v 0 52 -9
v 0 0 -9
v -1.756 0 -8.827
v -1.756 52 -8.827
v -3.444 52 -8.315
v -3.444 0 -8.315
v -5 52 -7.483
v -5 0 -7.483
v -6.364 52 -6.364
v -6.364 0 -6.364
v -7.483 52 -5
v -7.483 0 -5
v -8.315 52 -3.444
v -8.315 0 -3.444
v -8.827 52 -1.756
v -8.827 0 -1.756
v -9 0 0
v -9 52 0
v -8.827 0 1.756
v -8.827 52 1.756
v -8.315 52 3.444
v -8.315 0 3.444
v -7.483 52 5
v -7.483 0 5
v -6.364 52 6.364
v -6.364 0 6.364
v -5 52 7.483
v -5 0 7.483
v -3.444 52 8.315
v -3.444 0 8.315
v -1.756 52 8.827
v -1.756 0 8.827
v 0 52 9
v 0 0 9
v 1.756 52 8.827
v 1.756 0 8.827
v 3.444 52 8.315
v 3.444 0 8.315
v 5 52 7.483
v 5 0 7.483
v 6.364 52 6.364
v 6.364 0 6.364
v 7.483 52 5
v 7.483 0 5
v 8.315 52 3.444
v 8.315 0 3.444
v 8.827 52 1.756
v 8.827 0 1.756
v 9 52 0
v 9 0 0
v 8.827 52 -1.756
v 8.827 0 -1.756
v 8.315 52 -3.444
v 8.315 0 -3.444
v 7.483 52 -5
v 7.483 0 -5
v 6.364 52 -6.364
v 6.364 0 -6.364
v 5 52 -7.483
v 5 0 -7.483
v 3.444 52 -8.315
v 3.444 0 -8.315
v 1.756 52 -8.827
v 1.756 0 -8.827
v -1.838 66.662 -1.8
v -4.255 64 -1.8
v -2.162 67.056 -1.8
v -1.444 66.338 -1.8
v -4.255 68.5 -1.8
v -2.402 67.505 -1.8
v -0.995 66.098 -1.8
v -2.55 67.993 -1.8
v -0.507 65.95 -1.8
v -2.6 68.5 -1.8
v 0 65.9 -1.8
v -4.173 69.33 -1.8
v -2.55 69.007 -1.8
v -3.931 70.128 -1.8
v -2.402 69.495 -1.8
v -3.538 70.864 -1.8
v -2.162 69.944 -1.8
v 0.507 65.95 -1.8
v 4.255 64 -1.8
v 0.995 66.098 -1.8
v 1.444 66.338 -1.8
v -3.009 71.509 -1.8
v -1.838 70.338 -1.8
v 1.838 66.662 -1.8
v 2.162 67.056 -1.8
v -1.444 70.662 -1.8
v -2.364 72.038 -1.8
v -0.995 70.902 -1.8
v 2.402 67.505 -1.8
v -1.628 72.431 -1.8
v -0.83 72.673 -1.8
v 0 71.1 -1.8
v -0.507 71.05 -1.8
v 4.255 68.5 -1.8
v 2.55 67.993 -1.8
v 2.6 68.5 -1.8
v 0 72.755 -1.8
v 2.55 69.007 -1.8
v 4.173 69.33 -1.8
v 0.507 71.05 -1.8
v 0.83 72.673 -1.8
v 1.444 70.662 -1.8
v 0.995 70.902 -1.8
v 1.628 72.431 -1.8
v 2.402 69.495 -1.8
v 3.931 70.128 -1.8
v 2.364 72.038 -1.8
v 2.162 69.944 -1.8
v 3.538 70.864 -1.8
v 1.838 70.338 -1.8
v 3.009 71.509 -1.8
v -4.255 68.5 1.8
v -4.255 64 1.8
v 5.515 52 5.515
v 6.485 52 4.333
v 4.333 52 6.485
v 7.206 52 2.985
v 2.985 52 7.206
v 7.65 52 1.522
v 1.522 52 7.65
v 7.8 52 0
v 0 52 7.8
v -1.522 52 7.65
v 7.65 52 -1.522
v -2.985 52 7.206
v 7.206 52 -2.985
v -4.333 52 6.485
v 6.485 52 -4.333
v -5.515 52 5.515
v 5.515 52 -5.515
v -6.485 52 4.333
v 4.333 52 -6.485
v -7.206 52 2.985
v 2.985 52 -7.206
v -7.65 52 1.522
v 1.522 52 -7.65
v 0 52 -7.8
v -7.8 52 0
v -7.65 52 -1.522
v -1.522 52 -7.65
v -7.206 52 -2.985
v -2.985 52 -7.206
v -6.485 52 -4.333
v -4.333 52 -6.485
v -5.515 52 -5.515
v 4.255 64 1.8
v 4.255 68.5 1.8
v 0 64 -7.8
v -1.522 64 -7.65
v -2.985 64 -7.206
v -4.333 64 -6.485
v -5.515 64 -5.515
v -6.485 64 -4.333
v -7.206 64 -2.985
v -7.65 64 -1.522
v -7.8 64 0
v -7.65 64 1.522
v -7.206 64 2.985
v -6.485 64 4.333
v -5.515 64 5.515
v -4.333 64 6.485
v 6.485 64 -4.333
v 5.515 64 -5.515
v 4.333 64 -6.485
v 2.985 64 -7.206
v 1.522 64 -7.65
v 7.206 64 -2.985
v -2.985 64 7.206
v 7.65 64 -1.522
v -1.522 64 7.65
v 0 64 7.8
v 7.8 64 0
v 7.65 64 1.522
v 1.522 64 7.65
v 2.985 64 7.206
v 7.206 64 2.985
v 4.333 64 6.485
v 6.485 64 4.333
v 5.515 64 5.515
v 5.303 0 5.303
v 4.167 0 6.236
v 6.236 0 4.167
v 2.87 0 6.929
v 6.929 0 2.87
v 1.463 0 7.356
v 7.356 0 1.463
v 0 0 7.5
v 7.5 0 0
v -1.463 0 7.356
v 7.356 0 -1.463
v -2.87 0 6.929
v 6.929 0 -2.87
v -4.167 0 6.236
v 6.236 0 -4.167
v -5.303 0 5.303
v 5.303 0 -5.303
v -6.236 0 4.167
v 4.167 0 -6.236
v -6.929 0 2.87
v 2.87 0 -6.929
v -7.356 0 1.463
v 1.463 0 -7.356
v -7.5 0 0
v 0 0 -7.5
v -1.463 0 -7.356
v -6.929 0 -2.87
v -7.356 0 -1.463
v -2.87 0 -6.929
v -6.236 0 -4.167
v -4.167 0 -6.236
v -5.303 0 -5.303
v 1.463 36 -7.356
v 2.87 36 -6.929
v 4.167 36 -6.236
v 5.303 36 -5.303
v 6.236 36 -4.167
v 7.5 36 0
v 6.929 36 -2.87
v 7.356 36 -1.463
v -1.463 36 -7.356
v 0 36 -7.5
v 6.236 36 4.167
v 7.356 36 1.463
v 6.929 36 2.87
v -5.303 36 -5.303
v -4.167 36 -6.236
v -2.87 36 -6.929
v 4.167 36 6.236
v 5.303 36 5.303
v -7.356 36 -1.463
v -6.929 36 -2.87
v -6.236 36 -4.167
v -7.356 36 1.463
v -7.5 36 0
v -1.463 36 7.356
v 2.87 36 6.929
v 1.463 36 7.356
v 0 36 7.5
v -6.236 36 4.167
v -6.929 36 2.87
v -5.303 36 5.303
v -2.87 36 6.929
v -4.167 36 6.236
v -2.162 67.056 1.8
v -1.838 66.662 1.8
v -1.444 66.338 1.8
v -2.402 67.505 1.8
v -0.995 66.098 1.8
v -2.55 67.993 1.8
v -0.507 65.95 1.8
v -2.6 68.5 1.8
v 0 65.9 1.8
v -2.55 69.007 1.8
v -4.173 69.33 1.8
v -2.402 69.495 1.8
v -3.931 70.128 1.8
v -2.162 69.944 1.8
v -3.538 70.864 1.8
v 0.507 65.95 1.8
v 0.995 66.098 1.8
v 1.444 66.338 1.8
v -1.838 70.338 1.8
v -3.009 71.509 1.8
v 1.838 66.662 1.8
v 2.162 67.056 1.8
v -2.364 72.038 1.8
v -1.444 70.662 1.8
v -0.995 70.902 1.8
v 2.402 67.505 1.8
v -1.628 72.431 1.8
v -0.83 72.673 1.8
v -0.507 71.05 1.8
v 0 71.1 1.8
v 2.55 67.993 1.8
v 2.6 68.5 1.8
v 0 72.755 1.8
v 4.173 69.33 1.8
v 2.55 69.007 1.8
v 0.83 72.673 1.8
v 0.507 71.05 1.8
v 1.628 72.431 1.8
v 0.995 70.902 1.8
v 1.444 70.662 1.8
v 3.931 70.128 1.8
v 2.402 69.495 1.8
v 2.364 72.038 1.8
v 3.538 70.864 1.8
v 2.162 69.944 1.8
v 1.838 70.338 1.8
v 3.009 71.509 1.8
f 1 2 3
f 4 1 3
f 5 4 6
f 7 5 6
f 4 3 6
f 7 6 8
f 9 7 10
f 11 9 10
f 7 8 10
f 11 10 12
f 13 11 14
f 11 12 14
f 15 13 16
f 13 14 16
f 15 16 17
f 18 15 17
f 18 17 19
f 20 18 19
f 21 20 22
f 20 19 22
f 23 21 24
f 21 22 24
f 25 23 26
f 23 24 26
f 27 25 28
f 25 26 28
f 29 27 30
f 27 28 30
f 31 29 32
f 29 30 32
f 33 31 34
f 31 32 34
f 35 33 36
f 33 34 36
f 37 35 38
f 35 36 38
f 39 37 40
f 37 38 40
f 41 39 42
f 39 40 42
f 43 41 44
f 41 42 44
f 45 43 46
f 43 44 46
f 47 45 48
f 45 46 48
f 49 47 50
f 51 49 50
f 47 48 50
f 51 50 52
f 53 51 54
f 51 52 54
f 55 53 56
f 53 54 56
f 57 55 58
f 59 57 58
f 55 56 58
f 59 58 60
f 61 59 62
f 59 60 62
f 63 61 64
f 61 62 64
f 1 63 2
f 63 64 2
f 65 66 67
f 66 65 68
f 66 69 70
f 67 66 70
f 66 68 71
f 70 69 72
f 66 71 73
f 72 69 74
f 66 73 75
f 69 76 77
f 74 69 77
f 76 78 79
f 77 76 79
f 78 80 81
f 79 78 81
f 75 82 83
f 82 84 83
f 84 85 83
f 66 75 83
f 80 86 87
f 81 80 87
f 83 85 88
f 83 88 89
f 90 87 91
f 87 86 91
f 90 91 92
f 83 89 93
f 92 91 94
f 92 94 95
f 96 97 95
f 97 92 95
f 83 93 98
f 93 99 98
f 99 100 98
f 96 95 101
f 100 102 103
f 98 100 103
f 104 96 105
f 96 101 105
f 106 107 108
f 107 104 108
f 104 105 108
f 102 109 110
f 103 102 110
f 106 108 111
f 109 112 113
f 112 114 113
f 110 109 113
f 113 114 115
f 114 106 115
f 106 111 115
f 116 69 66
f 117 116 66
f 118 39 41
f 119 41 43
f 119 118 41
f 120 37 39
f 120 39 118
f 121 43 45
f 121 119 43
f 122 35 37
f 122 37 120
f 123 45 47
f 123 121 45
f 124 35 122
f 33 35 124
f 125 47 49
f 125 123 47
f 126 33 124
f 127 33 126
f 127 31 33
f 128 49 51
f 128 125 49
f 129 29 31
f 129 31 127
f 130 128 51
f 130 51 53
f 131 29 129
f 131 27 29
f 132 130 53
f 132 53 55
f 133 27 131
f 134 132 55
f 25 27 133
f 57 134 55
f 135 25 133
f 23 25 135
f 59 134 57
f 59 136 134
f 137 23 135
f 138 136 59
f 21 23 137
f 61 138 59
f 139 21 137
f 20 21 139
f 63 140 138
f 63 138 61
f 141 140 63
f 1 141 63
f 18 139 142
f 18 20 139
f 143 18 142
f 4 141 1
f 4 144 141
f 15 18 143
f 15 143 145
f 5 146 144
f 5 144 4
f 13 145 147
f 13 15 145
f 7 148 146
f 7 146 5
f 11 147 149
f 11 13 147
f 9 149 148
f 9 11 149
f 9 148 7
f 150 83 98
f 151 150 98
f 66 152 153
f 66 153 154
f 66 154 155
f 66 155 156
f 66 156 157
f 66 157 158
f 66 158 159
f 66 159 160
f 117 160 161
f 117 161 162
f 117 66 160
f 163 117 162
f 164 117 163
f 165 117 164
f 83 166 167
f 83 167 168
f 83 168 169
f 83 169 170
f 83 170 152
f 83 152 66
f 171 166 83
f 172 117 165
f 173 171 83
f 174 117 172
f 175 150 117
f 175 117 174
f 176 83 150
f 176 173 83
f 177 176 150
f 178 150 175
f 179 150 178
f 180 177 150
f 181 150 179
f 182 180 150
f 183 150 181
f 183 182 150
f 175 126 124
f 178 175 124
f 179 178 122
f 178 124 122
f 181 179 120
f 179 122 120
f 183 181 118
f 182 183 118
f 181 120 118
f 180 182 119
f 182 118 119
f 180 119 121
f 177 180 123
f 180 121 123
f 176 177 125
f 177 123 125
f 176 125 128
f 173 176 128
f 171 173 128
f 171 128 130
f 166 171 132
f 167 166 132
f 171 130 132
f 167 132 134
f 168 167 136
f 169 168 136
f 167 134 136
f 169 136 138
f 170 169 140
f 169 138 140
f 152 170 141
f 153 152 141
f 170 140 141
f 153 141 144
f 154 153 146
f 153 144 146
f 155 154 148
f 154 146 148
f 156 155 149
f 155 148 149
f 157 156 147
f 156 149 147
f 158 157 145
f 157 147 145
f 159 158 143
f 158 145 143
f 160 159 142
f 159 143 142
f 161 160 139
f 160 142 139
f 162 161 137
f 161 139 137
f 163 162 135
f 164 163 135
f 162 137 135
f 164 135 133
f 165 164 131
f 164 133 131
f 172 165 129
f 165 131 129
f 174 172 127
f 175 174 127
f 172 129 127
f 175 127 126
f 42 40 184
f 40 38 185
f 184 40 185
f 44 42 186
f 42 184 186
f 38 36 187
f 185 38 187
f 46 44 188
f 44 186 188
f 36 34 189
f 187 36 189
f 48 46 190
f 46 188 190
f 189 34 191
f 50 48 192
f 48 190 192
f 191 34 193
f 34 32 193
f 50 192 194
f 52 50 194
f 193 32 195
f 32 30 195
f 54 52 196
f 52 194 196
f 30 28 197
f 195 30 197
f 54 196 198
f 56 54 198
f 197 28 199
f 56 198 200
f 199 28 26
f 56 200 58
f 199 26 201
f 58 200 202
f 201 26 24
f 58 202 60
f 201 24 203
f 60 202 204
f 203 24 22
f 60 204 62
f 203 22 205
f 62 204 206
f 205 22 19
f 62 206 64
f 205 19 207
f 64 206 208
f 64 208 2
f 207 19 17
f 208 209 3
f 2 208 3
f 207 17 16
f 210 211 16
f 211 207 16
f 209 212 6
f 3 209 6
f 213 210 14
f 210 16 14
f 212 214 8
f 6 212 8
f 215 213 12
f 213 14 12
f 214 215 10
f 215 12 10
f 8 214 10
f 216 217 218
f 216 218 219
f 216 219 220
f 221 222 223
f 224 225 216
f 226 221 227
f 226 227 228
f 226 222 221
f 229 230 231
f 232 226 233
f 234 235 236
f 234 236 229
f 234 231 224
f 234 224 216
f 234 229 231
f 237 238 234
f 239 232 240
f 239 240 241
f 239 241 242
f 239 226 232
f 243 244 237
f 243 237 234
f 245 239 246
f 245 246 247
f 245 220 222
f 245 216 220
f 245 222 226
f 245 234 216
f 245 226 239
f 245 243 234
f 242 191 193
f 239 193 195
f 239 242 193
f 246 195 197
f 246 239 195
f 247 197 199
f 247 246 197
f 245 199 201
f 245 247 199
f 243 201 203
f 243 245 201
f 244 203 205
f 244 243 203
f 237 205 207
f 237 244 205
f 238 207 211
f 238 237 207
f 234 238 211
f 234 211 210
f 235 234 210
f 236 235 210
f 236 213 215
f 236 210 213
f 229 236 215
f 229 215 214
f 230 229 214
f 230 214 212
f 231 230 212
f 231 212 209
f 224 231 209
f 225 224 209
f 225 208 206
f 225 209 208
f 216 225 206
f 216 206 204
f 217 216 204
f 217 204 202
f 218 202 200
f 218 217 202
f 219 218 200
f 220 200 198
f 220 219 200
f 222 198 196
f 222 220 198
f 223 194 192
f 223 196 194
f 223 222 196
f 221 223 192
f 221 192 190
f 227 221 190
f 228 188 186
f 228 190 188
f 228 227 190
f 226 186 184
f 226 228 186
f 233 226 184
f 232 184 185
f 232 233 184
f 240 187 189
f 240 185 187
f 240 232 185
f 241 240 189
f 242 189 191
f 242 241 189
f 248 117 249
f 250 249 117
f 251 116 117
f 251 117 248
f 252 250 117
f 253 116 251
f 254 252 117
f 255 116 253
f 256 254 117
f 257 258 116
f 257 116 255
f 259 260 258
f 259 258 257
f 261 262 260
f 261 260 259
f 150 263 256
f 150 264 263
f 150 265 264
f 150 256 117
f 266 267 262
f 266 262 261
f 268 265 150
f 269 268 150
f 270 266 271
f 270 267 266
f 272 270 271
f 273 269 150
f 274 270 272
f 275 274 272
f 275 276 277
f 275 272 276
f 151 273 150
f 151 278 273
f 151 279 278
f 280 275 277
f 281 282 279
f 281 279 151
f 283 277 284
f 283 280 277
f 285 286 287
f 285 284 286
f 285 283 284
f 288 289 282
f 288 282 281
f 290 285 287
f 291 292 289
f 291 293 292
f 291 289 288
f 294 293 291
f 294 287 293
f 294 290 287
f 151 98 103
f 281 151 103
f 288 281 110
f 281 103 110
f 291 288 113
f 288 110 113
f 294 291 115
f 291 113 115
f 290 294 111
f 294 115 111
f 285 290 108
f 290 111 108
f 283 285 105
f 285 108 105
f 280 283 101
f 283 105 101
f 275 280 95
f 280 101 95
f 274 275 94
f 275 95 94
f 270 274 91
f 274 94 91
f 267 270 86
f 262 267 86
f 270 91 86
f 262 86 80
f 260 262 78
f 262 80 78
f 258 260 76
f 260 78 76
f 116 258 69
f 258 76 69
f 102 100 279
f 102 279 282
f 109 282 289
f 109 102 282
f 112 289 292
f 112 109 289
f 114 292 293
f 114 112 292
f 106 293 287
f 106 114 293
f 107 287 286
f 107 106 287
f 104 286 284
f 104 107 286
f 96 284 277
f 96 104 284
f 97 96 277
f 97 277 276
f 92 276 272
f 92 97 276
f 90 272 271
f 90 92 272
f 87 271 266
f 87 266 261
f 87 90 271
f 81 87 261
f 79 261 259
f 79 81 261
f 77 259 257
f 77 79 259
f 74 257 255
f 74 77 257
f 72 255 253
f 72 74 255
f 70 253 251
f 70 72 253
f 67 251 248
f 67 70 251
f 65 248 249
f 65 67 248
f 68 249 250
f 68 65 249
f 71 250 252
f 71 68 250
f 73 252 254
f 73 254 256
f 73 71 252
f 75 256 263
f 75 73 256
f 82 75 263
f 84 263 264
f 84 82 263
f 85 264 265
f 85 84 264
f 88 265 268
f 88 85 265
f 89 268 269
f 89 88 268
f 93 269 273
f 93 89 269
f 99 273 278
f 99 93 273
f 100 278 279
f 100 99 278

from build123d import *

# Parameters (mm, degrees)
SKETCH_1_R               = 9
EXTRUDE_1_DEPTH          = 52
SKETCH_2_R               = 7.8
EXTRUDE_2_DEPTH          = 12
EXTRUDE_3_DEPTH          = 1.8
EXTRUDE_3_DEPTH_BACK     = 1.8
SKETCH_3_R               = 2.6
EXTRUDE_4_DEPTH          = 1.8
EXTRUDE_4_DEPTH_BACK     = 1.8
SKETCH_4_R               = 1.6
CUT_EXTRUDE_1_DEPTH      = 27
CUT_EXTRUDE_1_DEPTH_BACK = 36
SKETCH_5_R               = 7.5


with BuildPart() as part:
    # 草图1 → 凸台-拉伸1 (new body)
    with BuildSketch(Plane(origin=(0, 0, 0), x_dir=(1, 0, 0), z_dir=(0, 1, 0))):
        Circle(SKETCH_1_R)
    extrude(amount=EXTRUDE_1_DEPTH)

    # 草图2 → 凸台-拉伸2 (add)
    with BuildSketch(Plane(origin=(0, 52, 0), x_dir=(1, 0, 0), z_dir=(0, 1, 0))):
        Circle(SKETCH_2_R)
    extrude(amount=EXTRUDE_2_DEPTH)

    # 草图3 → 凸台-拉伸3 (add, two sides: drawn at the far end of the back side and taken through both)
    with BuildSketch(Plane.XY.offset(-EXTRUDE_3_DEPTH_BACK)):
        with BuildLine():
            Line((-4.255, 68.5), (-4.255, 59.5))
            Line((-4.255, 59.5), (4.255, 59.5))
            Line((4.255, 59.5), (4.255, 68.5))
            ThreePointArc((4.255, 68.5), (0, 72.755), (-4.255, 68.5))
        make_face()
        with Locations((0, 68.5)):
            Circle(SKETCH_3_R, mode=Mode.SUBTRACT)
    extrude(amount=EXTRUDE_3_DEPTH + EXTRUDE_3_DEPTH_BACK)

    # 草图4 → 凸台-拉伸4 (add, two sides: drawn at the far end of the back side and taken through both)
    with BuildSketch(Plane.XY.offset(-EXTRUDE_4_DEPTH_BACK)):
        with BuildLine():
            Line((-4.65, -16.5), (-4.65, -8.5))
            Line((-4.65, -8.5), (-4.65, 0))
            Line((-4.65, 0), (4.65, 0))
            Line((4.65, 0), (4.65, -8.5))
            Line((4.65, -8.5), (4.65, -16.5))
            ThreePointArc((4.65, -16.5), (0, -21.15), (-4.65, -16.5))
        make_face()
        with Locations((0, -16.5)):
            Circle(SKETCH_4_R, mode=Mode.SUBTRACT)
    extrude(amount=EXTRUDE_4_DEPTH + EXTRUDE_4_DEPTH_BACK)

    # 草图5 → 切除-拉伸1 (cut, two sides: drawn at the far end of the back side and taken through both)
    with BuildSketch(Plane.XZ.offset(-CUT_EXTRUDE_1_DEPTH_BACK)):
        Circle(SKETCH_5_R)
    extrude(amount=CUT_EXTRUDE_1_DEPTH + CUT_EXTRUDE_1_DEPTH_BACK, mode=Mode.SUBTRACT)


solid = part.part
